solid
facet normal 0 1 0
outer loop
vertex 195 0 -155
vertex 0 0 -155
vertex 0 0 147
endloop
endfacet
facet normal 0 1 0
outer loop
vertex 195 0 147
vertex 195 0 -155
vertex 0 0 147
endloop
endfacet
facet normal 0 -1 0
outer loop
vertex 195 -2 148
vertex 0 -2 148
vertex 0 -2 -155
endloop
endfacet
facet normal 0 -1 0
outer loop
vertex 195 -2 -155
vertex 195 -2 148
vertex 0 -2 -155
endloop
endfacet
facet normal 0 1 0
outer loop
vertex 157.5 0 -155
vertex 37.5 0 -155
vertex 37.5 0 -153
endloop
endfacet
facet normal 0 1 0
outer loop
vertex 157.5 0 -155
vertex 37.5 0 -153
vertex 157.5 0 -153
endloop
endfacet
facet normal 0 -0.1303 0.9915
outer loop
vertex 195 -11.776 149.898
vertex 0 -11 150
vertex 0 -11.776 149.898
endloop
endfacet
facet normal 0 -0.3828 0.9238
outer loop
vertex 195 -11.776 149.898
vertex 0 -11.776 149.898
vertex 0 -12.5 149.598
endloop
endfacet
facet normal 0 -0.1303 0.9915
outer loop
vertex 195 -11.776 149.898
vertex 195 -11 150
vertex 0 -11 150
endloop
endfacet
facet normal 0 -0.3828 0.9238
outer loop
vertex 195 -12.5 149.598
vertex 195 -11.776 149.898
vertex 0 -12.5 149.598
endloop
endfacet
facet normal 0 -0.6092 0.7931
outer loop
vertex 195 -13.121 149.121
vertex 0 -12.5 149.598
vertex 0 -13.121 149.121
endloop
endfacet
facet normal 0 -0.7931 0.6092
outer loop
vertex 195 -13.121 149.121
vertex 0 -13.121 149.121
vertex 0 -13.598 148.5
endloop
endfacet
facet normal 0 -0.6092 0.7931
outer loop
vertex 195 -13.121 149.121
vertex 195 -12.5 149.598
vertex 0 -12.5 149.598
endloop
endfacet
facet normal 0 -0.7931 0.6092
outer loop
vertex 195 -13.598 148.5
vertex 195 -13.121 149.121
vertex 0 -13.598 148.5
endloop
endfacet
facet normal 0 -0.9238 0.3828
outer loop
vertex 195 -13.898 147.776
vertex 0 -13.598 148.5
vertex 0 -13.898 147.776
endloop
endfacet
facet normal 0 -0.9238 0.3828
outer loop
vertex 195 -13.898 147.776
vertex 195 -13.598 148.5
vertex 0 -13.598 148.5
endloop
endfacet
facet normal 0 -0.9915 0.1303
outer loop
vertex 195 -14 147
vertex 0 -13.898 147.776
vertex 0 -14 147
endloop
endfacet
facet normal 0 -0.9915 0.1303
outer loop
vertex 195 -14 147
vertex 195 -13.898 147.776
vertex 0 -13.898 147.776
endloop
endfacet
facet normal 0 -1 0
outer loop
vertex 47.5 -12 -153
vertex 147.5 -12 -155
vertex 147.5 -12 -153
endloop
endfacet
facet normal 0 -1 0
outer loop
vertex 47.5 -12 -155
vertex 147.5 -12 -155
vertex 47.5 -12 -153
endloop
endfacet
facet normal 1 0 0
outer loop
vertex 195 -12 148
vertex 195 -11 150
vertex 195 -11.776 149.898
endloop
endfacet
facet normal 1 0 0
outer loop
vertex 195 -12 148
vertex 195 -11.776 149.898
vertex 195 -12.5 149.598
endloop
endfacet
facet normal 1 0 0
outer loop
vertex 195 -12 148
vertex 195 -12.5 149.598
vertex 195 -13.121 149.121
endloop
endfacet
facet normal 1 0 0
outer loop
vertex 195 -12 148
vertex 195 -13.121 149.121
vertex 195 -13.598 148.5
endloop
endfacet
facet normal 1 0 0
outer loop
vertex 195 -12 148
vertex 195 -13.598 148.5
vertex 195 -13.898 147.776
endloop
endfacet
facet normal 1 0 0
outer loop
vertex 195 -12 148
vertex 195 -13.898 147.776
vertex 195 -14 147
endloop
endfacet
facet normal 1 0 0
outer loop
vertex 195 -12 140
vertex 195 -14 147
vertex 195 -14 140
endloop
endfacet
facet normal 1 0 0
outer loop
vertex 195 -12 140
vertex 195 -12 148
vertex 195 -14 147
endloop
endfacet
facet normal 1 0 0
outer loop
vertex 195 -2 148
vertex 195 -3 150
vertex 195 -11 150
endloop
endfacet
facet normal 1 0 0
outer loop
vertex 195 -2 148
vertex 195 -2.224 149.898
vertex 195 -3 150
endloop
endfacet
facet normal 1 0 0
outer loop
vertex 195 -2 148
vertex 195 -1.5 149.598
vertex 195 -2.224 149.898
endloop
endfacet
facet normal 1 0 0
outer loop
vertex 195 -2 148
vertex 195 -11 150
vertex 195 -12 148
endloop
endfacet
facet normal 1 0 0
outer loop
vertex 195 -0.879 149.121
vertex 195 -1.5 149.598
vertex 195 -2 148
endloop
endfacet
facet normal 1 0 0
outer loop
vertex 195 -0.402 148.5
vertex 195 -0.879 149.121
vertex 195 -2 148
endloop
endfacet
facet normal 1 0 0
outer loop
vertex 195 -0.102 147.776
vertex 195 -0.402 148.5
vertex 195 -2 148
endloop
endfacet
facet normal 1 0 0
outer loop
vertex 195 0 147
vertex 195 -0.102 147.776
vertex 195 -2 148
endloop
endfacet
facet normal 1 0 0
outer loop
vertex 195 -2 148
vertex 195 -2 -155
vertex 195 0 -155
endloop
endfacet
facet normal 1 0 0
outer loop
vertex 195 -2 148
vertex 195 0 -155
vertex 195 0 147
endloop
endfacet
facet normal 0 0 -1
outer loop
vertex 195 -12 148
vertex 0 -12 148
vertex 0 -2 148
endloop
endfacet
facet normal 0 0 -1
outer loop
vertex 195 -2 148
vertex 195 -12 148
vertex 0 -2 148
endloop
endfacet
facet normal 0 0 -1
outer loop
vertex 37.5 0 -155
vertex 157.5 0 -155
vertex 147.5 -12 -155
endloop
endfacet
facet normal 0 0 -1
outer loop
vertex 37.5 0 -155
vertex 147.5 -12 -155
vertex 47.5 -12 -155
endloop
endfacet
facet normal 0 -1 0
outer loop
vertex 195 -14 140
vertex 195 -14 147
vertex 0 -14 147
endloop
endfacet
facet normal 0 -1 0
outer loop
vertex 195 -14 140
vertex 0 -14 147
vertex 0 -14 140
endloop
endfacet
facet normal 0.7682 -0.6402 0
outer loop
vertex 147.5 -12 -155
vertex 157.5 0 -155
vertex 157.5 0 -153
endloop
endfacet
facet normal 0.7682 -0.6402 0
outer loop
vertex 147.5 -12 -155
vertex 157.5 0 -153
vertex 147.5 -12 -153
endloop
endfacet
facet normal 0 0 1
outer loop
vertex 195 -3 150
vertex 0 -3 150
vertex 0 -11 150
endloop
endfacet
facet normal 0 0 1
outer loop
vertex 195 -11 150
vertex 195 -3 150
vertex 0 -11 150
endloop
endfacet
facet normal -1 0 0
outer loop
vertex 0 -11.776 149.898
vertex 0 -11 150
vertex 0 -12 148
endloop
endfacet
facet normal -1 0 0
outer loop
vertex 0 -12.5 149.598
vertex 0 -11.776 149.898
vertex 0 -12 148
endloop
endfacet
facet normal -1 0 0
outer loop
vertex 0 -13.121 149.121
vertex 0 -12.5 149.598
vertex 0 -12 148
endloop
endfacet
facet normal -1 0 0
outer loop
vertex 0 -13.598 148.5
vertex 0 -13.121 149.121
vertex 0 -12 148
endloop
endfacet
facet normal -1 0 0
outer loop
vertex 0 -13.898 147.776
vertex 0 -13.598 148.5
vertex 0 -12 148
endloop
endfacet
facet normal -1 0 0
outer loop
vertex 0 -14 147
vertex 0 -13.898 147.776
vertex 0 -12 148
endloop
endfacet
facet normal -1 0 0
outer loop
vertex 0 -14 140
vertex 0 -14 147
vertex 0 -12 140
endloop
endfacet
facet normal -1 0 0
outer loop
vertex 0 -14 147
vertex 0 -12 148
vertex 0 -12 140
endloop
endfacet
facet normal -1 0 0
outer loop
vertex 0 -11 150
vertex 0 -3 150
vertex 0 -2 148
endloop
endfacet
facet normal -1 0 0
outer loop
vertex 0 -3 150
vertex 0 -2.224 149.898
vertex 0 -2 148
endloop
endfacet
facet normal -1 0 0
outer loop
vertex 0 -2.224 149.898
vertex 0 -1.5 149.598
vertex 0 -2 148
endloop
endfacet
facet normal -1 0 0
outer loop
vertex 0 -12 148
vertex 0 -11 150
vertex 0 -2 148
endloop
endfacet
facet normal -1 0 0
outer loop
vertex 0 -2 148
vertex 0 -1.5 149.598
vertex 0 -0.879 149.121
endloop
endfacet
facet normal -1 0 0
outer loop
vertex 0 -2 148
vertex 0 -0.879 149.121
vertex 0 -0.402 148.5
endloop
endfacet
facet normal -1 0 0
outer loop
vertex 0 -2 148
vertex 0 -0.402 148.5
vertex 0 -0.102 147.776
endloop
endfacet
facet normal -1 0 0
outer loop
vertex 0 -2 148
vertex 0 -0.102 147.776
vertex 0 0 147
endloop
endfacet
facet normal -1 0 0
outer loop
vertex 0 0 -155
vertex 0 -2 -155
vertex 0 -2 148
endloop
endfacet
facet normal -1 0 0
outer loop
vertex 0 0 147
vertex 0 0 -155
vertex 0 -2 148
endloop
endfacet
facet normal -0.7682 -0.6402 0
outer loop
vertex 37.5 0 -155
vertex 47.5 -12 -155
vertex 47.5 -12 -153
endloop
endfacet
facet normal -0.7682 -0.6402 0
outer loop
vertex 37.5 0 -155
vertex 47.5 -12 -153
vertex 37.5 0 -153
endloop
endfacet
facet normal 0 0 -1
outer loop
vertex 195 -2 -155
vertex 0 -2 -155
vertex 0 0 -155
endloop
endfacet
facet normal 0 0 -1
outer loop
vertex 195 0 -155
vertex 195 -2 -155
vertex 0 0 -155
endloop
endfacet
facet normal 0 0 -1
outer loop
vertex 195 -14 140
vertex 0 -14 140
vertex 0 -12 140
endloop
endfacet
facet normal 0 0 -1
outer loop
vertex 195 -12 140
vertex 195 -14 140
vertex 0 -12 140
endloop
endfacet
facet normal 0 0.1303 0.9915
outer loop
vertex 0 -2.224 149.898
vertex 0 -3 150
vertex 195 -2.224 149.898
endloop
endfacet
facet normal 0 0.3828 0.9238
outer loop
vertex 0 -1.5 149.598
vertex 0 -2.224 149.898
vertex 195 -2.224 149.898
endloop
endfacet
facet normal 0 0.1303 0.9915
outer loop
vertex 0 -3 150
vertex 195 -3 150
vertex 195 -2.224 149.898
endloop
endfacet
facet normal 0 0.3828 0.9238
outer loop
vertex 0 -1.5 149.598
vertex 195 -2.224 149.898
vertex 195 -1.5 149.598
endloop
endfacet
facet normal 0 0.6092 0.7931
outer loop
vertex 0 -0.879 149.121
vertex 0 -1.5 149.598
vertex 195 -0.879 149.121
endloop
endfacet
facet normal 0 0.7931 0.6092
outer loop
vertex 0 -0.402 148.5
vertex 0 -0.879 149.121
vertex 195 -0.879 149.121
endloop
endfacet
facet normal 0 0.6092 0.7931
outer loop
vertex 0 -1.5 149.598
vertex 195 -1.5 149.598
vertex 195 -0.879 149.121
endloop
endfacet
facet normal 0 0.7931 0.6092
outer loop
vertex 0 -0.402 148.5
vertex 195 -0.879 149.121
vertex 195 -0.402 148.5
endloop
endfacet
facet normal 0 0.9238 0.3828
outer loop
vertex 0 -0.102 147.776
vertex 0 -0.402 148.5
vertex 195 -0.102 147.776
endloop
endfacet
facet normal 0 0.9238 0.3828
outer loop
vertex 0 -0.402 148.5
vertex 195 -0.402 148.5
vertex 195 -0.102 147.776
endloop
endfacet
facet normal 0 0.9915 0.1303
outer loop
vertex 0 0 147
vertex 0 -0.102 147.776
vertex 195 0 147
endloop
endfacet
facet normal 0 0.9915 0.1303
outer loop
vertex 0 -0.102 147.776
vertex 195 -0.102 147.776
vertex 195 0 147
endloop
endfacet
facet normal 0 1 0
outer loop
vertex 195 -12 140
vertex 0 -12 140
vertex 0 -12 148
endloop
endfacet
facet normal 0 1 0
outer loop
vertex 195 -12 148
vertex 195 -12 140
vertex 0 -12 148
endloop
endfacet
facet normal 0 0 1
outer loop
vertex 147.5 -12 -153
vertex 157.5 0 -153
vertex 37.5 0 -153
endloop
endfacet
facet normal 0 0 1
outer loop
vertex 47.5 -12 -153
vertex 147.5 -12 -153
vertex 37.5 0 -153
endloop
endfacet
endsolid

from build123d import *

# Parameters (mm, degrees)
RESSALTO_EXTRUS_O1_DEPTH = 195
RESSALTO_EXTRUS_O2_DEPTH = 2
FILETE1_R                = 3


with BuildPart() as part:
    # Esboço1 → Ressalto-extrusão1 (new body)
    with BuildSketch(Plane(origin=(0, 0, 0), x_dir=(0, 0, -1), z_dir=(1, 0, 0))):
        Polygon((0, 0), (-150, 0), (-150, -14), (-140, -14), (-140, -12), (-148, -12), (-148, -2), (0, -2), (155, -2), (155, 0), align=None)
    extrude(amount=RESSALTO_EXTRUS_O1_DEPTH)

    # Filete1
    filete1_edges = [part.edges().sort_by_distance(p)[0] for p in [
        (97.5, -14, 150),
        (97.5, 0, 150),
    ]]
    fillet(filete1_edges, radius=FILETE1_R)


with BuildPart() as body_2:
    # Esboço2 → Ressalto-extrusão2 (new body)
    with BuildSketch(Plane(origin=(0, 0, -155), x_dir=(-1, 0, 0), z_dir=(0, 0, -1))):
        Polygon((-37.5, 0), (-157.5, 0), (-147.5, -12), (-47.5, -12), align=None)
    extrude(amount=-RESSALTO_EXTRUS_O2_DEPTH)


solid = Compound([part.part, body_2.part])
